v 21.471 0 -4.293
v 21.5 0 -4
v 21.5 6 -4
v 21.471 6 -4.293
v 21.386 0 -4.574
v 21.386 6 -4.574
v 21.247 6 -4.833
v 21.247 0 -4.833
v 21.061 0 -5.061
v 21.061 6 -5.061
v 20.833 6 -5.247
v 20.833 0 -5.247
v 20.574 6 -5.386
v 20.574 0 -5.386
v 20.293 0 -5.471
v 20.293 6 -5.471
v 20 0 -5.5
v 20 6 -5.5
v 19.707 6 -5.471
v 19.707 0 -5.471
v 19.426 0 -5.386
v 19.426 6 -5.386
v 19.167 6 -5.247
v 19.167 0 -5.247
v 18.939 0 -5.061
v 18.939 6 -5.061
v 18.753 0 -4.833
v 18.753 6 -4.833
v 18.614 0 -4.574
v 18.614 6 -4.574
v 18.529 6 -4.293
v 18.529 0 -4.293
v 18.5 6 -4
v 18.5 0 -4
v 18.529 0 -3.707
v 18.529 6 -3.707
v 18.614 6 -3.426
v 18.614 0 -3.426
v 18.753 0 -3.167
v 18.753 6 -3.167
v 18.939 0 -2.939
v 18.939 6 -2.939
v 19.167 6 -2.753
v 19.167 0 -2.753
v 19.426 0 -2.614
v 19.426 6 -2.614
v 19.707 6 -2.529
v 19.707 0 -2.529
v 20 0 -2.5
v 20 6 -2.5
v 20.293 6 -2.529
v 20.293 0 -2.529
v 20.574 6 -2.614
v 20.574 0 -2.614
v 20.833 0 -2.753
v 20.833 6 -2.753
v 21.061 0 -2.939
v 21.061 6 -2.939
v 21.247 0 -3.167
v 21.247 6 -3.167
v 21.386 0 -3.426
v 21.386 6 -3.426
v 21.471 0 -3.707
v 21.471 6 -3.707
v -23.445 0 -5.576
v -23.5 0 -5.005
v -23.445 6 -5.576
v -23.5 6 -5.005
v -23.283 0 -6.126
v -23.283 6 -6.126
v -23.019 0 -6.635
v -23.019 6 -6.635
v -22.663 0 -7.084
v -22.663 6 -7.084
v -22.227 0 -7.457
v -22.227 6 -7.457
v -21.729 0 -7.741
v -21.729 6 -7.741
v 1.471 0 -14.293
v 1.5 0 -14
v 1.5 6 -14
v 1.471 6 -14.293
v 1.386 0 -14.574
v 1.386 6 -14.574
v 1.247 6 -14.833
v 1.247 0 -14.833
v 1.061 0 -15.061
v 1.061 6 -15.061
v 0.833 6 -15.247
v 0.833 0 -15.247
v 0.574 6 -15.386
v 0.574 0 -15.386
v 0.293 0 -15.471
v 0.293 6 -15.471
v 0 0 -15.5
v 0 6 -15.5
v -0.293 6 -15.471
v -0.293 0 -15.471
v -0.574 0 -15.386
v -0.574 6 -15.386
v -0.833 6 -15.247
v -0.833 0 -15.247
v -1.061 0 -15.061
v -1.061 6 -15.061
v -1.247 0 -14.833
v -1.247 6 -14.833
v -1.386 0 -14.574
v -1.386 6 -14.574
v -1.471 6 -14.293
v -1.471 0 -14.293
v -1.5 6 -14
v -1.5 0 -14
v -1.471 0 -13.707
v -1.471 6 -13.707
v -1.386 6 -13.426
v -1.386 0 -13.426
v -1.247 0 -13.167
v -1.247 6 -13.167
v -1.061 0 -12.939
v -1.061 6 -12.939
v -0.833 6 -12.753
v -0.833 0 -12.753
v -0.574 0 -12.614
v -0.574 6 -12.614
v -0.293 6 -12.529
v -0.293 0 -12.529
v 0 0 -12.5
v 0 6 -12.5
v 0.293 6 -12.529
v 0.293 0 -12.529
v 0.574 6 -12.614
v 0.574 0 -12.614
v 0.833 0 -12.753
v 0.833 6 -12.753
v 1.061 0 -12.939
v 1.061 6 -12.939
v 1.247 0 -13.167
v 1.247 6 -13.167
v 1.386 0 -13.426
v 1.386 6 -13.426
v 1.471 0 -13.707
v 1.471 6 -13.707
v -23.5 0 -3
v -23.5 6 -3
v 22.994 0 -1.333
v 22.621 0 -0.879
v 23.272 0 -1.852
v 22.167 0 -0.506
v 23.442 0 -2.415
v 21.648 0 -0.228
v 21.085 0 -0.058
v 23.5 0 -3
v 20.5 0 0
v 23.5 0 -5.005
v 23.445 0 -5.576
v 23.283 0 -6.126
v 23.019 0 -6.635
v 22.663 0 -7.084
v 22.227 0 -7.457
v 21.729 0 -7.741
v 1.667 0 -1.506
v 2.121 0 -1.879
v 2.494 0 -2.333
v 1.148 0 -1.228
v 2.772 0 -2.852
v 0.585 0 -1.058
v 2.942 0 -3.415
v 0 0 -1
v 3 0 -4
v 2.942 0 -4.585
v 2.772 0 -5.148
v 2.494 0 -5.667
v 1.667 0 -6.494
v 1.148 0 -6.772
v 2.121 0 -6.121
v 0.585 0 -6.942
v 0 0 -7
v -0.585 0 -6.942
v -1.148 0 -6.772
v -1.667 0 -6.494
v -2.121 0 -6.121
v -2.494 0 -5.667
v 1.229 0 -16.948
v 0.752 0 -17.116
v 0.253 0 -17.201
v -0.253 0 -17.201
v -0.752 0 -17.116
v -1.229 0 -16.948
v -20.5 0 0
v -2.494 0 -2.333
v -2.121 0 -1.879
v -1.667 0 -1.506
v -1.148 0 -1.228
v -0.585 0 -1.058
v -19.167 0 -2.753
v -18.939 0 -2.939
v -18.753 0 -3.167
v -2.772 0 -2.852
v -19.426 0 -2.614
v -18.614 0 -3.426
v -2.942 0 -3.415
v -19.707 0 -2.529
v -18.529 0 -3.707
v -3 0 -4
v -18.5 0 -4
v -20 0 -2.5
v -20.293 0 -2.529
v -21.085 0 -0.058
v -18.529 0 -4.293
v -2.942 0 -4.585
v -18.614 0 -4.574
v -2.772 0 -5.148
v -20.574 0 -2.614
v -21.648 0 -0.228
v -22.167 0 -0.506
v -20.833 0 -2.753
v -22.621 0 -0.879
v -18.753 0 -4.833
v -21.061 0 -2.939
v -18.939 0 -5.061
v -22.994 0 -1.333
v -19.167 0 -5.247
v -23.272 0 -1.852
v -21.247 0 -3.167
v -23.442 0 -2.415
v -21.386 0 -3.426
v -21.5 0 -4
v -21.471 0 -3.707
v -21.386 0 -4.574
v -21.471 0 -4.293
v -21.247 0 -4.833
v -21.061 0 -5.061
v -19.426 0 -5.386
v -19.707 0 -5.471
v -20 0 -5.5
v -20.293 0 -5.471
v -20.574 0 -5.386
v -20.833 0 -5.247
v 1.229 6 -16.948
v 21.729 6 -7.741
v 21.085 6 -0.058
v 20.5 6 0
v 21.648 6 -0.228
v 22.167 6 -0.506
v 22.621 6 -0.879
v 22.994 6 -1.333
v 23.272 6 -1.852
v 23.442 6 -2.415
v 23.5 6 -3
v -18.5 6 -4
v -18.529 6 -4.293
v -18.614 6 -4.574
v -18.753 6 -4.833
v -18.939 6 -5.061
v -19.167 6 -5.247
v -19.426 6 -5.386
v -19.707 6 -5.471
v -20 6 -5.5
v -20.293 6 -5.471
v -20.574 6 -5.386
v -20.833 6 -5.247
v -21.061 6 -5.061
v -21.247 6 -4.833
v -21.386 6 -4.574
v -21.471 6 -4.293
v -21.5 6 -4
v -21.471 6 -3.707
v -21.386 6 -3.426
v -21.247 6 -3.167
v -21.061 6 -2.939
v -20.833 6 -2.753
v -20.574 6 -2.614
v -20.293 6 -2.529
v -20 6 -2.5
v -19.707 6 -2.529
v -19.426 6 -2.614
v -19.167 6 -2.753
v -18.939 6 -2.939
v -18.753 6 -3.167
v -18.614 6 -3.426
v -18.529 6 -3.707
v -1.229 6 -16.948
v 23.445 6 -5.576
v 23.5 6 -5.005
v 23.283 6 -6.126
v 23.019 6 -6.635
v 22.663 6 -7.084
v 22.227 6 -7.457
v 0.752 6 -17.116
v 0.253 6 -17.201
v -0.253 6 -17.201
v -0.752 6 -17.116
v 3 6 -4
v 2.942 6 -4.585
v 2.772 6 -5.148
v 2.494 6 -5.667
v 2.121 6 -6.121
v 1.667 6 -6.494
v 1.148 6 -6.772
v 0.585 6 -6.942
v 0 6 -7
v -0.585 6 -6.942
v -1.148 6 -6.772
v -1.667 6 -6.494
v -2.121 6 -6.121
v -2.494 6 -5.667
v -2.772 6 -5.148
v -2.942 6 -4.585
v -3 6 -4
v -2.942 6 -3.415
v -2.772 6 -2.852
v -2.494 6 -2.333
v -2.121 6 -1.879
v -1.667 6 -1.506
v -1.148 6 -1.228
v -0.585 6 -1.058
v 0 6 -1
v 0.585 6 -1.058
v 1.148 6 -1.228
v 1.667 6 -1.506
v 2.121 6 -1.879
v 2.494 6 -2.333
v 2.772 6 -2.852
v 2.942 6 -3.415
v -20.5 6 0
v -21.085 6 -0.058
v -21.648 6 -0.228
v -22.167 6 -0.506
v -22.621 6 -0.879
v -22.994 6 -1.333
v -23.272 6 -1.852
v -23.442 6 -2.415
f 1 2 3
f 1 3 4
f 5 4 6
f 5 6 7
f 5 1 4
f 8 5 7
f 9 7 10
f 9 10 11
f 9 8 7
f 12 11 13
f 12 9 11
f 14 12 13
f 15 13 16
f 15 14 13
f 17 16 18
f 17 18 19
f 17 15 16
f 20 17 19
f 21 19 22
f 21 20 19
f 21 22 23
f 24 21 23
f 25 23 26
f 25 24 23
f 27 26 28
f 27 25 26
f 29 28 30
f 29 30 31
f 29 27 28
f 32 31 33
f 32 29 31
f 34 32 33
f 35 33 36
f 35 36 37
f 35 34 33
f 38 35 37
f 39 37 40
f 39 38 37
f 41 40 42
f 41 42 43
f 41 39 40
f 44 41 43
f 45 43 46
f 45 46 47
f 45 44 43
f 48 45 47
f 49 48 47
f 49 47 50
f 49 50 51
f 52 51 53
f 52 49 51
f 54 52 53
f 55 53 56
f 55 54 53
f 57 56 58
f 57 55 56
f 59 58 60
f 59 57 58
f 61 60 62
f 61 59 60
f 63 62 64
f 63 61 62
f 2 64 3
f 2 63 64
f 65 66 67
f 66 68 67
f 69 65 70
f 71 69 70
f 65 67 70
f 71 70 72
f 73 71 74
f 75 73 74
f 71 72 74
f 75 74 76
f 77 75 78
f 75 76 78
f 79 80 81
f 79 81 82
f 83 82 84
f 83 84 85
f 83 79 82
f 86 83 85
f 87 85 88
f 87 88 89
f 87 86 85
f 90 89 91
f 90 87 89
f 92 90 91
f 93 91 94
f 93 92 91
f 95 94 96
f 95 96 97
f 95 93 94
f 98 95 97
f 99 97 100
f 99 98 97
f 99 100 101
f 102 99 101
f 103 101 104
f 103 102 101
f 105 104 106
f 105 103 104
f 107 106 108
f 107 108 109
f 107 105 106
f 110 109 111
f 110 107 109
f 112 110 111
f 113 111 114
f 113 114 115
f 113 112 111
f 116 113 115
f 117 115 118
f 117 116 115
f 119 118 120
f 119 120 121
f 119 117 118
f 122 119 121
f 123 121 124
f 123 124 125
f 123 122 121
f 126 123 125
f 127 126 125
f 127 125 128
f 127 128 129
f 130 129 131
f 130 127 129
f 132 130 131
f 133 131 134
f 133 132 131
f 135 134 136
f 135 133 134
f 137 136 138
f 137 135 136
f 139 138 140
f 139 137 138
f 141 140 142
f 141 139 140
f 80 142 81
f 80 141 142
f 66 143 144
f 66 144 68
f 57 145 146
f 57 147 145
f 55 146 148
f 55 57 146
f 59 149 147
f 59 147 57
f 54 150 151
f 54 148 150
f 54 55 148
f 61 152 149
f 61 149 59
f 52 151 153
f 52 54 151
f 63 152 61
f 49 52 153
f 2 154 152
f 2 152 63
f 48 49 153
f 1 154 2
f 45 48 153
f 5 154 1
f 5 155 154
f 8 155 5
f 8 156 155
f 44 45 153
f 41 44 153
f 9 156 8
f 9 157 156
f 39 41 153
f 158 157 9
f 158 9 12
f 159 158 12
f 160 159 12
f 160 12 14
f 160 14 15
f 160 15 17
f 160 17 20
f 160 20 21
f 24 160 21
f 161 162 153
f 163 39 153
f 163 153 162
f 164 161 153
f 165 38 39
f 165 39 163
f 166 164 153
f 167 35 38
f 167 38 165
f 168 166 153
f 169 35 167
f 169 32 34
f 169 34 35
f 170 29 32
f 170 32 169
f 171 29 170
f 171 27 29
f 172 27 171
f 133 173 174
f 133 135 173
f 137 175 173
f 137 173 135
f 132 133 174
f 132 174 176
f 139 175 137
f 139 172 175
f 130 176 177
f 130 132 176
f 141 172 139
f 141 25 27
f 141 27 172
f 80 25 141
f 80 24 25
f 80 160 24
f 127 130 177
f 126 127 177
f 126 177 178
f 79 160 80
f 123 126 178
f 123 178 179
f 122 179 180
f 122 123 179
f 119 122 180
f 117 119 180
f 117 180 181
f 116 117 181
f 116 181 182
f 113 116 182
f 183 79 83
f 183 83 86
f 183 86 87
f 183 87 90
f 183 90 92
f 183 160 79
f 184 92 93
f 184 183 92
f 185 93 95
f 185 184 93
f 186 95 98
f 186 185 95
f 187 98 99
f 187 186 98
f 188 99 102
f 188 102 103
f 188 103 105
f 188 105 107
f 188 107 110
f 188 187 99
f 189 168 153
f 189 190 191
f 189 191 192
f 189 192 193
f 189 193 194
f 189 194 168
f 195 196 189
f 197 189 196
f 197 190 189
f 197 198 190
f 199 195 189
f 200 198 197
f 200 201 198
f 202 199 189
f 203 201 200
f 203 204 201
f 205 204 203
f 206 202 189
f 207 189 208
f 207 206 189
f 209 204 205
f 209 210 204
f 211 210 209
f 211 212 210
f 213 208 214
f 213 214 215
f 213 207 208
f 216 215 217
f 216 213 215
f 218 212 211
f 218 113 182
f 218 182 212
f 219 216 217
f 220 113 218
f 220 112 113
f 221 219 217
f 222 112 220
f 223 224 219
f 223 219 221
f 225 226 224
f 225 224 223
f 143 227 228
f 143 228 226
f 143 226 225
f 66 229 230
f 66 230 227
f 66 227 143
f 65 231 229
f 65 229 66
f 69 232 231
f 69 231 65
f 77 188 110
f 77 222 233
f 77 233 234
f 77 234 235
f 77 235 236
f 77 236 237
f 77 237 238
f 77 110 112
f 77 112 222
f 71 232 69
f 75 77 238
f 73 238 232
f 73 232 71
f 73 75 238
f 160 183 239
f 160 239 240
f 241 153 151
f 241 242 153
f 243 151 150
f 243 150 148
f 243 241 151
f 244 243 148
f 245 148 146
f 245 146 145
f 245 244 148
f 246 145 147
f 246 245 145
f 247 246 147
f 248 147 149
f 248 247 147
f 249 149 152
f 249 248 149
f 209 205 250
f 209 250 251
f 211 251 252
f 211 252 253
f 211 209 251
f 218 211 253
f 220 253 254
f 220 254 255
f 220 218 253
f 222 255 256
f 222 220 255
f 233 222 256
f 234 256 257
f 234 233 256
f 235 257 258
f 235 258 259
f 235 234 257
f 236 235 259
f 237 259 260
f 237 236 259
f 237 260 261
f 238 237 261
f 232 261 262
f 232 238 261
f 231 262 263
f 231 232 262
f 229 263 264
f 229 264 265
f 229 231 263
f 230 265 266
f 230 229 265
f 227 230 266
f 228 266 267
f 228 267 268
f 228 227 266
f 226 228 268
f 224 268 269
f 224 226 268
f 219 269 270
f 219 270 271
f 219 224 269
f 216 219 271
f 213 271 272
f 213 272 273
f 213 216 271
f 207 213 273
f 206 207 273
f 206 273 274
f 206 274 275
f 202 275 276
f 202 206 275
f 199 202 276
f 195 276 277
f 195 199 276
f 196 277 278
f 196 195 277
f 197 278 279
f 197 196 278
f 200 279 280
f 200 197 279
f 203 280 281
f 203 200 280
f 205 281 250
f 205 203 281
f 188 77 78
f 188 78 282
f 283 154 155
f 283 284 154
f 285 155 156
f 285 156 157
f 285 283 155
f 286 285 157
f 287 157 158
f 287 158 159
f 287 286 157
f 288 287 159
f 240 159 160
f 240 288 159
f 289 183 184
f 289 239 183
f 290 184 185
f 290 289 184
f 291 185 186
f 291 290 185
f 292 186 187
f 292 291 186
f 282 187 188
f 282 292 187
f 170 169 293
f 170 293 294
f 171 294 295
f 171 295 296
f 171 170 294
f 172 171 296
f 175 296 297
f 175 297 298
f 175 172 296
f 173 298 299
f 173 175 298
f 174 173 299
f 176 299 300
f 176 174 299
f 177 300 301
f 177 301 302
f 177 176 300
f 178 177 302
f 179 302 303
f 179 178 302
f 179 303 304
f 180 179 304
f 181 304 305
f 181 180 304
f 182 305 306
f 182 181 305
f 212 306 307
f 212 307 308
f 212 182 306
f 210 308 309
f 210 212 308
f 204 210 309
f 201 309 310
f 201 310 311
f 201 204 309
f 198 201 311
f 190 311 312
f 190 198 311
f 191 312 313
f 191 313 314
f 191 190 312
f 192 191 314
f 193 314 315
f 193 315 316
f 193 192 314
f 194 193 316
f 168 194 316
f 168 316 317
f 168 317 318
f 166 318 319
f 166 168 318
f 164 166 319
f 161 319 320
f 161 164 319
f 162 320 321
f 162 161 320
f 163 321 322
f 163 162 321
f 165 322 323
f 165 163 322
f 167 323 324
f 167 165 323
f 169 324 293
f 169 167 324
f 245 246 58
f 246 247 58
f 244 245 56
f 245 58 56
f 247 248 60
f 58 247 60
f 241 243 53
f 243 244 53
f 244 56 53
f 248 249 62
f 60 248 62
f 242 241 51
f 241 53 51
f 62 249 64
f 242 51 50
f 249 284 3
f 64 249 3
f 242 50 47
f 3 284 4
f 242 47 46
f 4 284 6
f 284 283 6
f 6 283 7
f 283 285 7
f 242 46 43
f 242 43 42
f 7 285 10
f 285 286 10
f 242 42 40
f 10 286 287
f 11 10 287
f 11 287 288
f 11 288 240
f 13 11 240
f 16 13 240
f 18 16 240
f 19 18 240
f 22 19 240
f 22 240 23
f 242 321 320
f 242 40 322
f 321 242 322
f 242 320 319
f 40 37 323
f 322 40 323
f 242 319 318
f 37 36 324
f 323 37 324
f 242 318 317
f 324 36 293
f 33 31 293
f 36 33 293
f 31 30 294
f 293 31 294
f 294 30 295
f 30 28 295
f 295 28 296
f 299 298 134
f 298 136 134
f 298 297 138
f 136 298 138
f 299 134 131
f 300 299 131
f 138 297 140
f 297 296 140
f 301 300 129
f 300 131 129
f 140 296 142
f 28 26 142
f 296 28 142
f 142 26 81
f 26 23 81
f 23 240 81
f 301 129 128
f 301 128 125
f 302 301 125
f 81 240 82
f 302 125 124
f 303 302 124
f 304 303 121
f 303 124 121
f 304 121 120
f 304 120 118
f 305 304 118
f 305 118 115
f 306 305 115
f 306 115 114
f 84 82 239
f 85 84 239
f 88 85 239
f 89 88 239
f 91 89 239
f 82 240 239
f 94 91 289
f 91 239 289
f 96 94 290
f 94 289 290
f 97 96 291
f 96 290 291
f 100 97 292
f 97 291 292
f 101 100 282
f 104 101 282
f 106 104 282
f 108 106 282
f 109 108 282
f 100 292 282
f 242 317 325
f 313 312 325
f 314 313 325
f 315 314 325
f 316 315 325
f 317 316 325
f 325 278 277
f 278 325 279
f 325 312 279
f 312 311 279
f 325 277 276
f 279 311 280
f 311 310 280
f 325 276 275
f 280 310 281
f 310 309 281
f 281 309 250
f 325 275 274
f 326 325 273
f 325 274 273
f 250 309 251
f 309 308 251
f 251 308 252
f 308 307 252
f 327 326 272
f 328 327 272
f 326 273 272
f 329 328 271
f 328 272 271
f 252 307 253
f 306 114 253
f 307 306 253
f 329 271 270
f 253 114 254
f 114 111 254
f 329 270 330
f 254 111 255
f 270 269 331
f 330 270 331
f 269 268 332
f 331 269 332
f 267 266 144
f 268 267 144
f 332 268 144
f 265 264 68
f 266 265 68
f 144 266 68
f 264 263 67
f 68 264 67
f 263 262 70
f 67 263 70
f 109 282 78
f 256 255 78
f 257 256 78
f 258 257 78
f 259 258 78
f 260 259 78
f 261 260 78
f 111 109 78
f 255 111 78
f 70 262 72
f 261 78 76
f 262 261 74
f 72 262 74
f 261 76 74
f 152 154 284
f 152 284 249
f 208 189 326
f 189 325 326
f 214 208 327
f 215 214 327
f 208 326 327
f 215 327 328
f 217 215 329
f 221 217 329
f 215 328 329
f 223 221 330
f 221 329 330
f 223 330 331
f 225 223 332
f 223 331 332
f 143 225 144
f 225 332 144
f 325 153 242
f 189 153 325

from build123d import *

# Parameters (mm, degrees)
SKETCH1_R           = 3
SKETCH1_R_2         = 1.5
BOSS_EXTRUDE1_DEPTH = 6
FILLET1_R           = 3


with BuildPart() as part:
    # Sketch1 → Boss-Extrude1 (new body)
    with BuildSketch(Plane(origin=(0, 0, 0), x_dir=(1, 0, 0), z_dir=(0, 1, 0))):
        Polygon((23.5, 0), (-23.5, 0), (-23.5, 6.946022727), (0, 17.5), (23.5, 6.946022727), align=None)
        with Locations((0, 4)):
            Circle(SKETCH1_R, mode=Mode.SUBTRACT)
        with Locations((20, 4)):
            Circle(SKETCH1_R_2, mode=Mode.SUBTRACT)
        with Locations((-20, 4)):
            Circle(SKETCH1_R_2, mode=Mode.SUBTRACT)
        with Locations((0, 14)):
            Circle(SKETCH1_R_2, mode=Mode.SUBTRACT)
    extrude(amount=BOSS_EXTRUDE1_DEPTH)

    # Fillet1
    fillet1_edges = [part.edges().sort_by_distance(p)[0] for p in [
        (23.5, 3, 0),
        (-23.5, 3, 0),
        (-23.5, 3, -6.946022727),
        (0, 3, -17.5),
        (23.5, 3, -6.946022727),
    ]]
    fillet(fillet1_edges, radius=FILLET1_R)


solid = part.part
